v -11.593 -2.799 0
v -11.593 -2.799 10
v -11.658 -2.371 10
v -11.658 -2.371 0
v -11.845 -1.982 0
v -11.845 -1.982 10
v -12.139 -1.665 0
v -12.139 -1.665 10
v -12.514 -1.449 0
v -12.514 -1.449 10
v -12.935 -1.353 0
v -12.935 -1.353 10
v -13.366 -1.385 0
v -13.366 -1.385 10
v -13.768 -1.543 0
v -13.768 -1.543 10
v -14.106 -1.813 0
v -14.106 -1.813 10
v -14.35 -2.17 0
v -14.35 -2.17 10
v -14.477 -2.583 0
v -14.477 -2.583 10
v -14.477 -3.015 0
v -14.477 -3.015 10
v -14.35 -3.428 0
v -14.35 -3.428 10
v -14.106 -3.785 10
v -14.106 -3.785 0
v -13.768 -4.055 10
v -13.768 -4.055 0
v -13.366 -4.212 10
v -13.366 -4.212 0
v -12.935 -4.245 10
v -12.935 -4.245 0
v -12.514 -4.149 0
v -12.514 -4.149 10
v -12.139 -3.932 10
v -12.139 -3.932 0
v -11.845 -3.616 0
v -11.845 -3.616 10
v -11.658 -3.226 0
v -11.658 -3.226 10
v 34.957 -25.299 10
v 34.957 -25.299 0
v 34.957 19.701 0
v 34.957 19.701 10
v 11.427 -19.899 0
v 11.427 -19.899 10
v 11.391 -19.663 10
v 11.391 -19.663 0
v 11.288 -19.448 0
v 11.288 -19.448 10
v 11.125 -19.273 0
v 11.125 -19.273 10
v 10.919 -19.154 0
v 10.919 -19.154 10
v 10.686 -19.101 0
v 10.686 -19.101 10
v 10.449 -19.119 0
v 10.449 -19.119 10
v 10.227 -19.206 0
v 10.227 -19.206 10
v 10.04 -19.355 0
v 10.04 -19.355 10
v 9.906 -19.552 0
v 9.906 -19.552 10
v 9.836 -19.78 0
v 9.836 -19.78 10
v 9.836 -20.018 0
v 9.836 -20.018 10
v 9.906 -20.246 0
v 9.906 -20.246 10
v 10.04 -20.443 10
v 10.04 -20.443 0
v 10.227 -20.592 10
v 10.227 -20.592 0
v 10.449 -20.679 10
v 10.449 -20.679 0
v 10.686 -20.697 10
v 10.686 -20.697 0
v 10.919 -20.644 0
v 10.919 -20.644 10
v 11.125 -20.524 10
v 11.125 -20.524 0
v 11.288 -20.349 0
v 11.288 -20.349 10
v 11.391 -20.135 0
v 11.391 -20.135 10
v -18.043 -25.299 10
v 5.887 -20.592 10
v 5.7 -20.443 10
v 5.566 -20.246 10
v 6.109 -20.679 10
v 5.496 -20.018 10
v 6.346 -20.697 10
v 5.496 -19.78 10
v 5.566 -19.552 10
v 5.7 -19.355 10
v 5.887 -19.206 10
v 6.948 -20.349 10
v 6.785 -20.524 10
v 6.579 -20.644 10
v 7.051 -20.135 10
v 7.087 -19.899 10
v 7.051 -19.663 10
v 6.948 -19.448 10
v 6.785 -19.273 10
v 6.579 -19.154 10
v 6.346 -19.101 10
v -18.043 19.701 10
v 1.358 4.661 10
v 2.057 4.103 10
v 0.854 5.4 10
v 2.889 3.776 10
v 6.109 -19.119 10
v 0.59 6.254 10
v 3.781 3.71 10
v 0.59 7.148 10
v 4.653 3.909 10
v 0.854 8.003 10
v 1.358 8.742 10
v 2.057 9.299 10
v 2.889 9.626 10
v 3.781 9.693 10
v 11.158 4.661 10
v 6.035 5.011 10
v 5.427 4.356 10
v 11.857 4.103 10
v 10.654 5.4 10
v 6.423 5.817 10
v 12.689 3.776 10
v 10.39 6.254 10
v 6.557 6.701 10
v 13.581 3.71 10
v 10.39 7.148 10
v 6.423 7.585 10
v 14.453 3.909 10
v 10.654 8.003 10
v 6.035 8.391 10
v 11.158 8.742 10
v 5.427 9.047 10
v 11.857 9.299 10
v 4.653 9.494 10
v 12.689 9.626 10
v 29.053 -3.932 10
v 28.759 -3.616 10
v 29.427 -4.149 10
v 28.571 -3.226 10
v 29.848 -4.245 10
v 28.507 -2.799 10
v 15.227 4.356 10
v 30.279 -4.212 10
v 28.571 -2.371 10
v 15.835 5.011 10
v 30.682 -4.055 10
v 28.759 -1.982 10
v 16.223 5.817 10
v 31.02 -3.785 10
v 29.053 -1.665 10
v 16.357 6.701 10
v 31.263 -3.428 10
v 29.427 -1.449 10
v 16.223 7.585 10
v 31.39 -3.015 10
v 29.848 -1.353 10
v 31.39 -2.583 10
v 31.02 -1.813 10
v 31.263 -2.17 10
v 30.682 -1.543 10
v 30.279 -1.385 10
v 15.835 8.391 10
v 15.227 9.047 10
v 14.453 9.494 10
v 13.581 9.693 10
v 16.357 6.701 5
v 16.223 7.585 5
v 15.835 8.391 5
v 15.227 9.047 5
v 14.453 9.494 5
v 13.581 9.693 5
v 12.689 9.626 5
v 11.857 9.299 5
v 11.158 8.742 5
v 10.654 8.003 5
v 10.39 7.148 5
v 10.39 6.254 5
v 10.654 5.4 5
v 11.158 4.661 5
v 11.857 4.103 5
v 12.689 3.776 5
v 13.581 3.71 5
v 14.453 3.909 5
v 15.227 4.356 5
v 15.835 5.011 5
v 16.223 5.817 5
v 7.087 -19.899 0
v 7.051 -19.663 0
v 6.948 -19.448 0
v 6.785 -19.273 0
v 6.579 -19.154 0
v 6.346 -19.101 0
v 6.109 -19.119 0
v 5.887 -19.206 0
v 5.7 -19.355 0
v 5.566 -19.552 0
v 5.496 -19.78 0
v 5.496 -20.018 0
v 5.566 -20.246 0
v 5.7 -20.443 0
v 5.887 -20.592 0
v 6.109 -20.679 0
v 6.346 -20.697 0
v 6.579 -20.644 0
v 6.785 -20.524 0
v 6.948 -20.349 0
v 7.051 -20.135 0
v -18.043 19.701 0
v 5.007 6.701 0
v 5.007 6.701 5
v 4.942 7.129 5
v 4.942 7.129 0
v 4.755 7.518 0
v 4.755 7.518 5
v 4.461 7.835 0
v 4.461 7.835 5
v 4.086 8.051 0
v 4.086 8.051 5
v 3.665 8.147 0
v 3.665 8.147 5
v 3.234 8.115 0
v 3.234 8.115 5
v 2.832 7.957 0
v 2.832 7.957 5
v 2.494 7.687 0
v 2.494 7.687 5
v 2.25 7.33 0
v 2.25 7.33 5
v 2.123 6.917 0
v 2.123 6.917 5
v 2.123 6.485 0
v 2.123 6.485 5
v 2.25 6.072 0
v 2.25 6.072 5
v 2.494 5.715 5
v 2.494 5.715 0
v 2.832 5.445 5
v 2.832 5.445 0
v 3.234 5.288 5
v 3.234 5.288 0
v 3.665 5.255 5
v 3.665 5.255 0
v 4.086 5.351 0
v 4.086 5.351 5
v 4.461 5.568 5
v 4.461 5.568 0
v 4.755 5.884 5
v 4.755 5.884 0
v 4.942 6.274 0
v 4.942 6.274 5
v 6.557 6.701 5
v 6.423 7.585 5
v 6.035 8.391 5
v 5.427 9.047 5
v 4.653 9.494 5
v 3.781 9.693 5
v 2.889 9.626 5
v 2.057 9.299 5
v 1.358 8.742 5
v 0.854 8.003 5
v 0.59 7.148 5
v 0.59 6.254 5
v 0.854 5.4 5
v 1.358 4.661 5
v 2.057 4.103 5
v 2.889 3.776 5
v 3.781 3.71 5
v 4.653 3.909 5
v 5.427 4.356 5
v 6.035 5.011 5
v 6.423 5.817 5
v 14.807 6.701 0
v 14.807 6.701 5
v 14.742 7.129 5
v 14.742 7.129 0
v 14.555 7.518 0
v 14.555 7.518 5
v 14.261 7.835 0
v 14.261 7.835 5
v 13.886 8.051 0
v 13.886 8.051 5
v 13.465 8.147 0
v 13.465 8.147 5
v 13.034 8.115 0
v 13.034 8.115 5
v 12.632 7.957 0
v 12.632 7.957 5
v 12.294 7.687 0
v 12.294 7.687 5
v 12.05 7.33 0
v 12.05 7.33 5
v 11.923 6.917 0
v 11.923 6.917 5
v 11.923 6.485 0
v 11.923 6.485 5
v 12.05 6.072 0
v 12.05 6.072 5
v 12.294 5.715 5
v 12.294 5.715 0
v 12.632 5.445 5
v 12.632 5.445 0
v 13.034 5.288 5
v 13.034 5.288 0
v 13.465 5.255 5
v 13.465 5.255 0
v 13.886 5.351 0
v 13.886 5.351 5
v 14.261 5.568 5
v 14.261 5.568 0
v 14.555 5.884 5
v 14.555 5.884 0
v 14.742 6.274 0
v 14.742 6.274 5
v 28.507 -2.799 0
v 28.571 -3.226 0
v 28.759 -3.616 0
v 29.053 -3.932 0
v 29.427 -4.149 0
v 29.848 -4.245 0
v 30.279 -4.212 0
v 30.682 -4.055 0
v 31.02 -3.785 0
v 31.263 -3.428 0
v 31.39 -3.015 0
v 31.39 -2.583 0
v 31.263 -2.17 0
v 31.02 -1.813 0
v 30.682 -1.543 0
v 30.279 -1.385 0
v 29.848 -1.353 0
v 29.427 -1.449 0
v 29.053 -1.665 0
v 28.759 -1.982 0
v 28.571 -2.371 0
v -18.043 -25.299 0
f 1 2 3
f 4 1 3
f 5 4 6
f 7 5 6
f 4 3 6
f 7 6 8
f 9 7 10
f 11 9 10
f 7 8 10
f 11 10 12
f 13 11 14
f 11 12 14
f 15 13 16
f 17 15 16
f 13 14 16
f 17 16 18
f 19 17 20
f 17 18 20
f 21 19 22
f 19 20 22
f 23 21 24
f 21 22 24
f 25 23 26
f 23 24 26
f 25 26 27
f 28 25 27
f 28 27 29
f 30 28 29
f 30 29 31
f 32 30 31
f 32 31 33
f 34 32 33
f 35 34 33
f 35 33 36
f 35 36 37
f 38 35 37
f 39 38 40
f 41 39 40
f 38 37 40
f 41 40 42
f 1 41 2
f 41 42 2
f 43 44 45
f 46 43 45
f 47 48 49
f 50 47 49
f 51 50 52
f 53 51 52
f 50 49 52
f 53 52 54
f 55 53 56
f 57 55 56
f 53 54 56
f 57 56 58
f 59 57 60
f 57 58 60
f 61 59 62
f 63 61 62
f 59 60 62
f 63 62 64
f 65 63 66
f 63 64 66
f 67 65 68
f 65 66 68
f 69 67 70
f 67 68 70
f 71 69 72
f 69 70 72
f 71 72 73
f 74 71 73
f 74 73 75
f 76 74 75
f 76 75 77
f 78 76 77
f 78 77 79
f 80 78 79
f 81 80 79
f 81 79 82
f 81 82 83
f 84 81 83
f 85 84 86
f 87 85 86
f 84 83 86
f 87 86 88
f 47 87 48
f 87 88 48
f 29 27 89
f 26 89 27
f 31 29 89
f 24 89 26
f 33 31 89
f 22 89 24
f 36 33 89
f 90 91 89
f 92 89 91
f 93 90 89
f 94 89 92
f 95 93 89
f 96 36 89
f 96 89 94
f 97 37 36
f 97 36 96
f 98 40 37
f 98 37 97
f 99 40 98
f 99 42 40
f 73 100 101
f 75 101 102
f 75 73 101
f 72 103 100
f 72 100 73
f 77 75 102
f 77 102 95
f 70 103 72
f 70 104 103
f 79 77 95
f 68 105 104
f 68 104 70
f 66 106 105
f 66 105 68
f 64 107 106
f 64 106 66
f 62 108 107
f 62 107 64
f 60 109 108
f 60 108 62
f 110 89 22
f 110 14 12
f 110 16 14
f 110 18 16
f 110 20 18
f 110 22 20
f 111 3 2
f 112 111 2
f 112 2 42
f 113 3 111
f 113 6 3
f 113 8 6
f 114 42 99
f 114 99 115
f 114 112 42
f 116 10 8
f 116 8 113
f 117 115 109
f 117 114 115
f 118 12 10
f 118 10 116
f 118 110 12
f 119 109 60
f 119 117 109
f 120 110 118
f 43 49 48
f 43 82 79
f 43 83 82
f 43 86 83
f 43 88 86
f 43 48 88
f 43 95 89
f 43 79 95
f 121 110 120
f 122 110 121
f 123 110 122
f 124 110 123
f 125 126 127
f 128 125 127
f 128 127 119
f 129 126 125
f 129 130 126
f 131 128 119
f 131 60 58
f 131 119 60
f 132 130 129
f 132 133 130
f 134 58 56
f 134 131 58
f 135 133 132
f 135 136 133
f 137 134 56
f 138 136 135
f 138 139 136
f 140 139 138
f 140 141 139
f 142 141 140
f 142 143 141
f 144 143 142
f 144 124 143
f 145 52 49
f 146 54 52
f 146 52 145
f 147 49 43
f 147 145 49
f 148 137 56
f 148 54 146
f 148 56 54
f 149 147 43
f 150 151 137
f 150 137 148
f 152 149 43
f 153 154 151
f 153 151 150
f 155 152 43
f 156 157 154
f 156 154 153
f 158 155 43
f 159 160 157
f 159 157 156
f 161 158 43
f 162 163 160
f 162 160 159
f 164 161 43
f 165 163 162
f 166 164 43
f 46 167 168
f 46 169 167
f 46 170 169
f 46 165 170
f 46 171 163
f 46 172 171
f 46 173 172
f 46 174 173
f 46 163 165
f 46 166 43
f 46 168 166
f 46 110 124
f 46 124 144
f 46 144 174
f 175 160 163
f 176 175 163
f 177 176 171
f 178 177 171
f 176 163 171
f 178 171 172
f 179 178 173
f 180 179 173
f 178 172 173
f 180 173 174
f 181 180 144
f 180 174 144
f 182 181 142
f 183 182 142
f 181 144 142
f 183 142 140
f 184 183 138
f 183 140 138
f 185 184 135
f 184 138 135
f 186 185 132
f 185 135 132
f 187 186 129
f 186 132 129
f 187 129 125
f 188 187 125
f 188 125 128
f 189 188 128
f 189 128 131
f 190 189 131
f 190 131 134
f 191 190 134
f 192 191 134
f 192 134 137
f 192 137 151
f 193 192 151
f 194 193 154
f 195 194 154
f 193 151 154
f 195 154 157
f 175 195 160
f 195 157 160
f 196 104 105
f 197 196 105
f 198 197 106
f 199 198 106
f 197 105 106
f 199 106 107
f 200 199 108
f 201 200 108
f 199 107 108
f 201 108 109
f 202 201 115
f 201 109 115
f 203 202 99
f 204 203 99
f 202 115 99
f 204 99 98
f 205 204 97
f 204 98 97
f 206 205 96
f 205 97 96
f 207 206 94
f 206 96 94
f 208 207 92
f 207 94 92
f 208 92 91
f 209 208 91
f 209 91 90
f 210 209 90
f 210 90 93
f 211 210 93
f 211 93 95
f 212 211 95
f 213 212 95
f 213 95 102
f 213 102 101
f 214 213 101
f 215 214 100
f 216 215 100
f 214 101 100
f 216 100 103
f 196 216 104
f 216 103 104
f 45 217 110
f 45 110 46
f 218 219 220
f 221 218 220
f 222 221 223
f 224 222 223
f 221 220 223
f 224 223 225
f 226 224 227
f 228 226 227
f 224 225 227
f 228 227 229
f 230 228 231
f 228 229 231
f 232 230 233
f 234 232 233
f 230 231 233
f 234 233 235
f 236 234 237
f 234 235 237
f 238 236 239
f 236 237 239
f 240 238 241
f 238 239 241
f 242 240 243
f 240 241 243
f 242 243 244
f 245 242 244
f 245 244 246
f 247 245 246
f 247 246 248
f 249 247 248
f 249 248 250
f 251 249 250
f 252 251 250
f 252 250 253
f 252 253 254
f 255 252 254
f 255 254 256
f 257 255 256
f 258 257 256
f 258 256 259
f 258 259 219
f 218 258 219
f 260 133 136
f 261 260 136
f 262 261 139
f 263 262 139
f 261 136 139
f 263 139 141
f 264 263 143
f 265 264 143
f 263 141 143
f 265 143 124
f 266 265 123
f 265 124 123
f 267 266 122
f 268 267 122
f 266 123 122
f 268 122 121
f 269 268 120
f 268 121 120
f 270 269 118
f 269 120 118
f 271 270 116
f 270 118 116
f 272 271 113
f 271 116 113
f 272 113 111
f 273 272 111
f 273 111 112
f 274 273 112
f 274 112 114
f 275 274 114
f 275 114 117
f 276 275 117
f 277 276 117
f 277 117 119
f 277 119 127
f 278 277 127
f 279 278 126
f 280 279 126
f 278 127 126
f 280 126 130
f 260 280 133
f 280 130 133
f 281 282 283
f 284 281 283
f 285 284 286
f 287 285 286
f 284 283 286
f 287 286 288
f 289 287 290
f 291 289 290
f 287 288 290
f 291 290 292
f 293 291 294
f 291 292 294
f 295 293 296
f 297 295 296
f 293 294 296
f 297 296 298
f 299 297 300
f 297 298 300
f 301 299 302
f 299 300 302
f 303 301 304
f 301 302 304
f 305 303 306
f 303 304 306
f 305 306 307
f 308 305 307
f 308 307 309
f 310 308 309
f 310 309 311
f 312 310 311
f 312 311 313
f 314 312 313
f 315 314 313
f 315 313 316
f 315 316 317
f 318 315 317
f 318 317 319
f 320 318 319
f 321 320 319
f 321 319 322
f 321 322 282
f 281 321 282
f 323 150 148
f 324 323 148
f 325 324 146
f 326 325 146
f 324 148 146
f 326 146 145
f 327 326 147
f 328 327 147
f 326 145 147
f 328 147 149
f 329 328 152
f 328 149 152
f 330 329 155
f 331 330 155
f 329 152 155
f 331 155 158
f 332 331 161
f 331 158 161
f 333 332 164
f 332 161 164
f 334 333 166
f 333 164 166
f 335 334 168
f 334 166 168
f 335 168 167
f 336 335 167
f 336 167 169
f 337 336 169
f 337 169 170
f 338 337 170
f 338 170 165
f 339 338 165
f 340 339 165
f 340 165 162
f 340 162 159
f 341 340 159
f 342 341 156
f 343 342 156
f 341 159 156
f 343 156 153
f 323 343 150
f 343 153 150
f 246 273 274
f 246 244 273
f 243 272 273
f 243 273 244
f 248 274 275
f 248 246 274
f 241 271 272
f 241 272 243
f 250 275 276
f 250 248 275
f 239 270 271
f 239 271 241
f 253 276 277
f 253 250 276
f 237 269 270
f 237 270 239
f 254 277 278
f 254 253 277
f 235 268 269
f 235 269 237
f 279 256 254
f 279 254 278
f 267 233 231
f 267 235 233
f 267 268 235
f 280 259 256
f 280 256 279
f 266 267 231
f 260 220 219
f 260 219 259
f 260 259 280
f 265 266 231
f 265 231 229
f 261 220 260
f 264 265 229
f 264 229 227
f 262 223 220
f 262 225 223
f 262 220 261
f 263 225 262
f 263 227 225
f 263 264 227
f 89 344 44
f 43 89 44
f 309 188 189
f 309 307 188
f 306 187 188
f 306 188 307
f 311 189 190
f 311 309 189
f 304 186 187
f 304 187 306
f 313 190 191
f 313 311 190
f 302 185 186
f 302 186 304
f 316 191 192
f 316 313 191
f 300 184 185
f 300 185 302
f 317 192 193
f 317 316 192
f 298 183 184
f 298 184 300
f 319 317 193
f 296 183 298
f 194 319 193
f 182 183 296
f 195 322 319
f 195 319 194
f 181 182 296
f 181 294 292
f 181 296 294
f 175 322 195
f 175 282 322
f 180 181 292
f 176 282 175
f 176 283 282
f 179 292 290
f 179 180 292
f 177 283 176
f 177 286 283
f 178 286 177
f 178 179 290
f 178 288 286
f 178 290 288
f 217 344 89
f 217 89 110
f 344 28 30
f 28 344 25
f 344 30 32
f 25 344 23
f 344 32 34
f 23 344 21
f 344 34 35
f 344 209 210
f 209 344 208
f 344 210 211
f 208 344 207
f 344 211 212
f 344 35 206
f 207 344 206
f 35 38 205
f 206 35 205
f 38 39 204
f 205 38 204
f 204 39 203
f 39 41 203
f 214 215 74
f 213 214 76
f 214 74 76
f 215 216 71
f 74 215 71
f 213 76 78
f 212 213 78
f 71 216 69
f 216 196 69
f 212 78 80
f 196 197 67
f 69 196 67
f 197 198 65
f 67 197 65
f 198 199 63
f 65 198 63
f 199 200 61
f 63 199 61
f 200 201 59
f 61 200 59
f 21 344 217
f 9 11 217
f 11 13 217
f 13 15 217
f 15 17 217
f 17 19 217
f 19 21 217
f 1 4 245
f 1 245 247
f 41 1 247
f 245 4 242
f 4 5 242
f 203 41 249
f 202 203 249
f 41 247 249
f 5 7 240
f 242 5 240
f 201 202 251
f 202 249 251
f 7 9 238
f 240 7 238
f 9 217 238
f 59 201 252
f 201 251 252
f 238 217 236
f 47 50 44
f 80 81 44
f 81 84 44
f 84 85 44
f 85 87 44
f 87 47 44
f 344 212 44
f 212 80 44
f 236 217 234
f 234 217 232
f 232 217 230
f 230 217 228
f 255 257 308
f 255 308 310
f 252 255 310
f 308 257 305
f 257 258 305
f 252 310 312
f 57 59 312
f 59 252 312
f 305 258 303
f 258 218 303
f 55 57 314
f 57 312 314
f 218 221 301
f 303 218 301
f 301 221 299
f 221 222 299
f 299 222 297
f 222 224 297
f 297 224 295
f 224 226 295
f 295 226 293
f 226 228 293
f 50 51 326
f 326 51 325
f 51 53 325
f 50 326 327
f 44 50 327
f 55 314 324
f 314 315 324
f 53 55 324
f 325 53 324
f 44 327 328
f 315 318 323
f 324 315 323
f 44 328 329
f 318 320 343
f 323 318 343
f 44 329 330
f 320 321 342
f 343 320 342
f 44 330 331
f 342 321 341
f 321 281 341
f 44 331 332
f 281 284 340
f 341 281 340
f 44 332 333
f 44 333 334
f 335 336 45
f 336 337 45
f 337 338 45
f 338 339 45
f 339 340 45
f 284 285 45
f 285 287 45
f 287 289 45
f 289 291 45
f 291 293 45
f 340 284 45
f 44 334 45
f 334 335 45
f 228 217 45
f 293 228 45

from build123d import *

# Parameters (mm, degrees)
CROQUIS1_W              = 53
CROQUIS1_H              = 45
SALIENTE_EXTRUIR1_DEPTH = 10
CROQUIS2_R              = 0.8
CORTAR_EXTRUIR1_DEPTH   = 10
CROQUIS3_R              = 1.45
CORTAR_EXTRUIR2_DEPTH   = 10
CROQUIS4_R              = 3
CORTAR_EXTRUIR3_DEPTH   = 5
CROQUIS5_R              = 1.45
CORTAR_EXTRUIR4_DEPTH   = 10


with BuildPart() as part:
    # Croquis1 → Saliente-Extruir1 (new body)
    with BuildSketch(Plane.XY):
        with Locations((8.456656727, -2.798833819)):
            Rectangle(CROQUIS1_W, CROQUIS1_H)
    extrude(amount=SALIENTE_EXTRUIR1_DEPTH)

    # Croquis2 → Cortar-Extruir1 (cut)
    with BuildSketch(Plane.XY.offset(10)):
        with Locations((6.286656727, -19.898833819)):
            Circle(CROQUIS2_R)
        with Locations((10.626656727, -19.898833819)):
            Circle(CROQUIS2_R)
    extrude(amount=-CORTAR_EXTRUIR1_DEPTH, mode=Mode.SUBTRACT)

    # Croquis3 → Cortar-Extruir2 (cut)
    with BuildSketch(Plane.XY.offset(10)):
        with Locations((13.356656727, 6.701166181)):
            Circle(CROQUIS3_R)
        with Locations((3.556656727, 6.701166181)):
            Circle(CROQUIS3_R)
    extrude(amount=-CORTAR_EXTRUIR2_DEPTH, mode=Mode.SUBTRACT)

    # Croquis4 → Cortar-Extruir3 (cut)
    with BuildSketch(Plane.XY.offset(10)):
        with Locations((3.556656727, 6.701166181)):
            Circle(CROQUIS4_R)
        with Locations((13.356656727, 6.701166181)):
            Circle(CROQUIS4_R)
    extrude(amount=-CORTAR_EXTRUIR3_DEPTH, mode=Mode.SUBTRACT)

    # Croquis5 → Cortar-Extruir4 (cut)
    with BuildSketch(Plane.XY.offset(10)):
        with Locations((-13.043343273, -2.798833819)):
            Circle(CROQUIS5_R)
        with Locations(Location((29.956656727, -2.798833819, 0), (0, 0, 180))):
            Circle(CROQUIS5_R)
    extrude(amount=-CORTAR_EXTRUIR4_DEPTH, mode=Mode.SUBTRACT)


solid = part.part
